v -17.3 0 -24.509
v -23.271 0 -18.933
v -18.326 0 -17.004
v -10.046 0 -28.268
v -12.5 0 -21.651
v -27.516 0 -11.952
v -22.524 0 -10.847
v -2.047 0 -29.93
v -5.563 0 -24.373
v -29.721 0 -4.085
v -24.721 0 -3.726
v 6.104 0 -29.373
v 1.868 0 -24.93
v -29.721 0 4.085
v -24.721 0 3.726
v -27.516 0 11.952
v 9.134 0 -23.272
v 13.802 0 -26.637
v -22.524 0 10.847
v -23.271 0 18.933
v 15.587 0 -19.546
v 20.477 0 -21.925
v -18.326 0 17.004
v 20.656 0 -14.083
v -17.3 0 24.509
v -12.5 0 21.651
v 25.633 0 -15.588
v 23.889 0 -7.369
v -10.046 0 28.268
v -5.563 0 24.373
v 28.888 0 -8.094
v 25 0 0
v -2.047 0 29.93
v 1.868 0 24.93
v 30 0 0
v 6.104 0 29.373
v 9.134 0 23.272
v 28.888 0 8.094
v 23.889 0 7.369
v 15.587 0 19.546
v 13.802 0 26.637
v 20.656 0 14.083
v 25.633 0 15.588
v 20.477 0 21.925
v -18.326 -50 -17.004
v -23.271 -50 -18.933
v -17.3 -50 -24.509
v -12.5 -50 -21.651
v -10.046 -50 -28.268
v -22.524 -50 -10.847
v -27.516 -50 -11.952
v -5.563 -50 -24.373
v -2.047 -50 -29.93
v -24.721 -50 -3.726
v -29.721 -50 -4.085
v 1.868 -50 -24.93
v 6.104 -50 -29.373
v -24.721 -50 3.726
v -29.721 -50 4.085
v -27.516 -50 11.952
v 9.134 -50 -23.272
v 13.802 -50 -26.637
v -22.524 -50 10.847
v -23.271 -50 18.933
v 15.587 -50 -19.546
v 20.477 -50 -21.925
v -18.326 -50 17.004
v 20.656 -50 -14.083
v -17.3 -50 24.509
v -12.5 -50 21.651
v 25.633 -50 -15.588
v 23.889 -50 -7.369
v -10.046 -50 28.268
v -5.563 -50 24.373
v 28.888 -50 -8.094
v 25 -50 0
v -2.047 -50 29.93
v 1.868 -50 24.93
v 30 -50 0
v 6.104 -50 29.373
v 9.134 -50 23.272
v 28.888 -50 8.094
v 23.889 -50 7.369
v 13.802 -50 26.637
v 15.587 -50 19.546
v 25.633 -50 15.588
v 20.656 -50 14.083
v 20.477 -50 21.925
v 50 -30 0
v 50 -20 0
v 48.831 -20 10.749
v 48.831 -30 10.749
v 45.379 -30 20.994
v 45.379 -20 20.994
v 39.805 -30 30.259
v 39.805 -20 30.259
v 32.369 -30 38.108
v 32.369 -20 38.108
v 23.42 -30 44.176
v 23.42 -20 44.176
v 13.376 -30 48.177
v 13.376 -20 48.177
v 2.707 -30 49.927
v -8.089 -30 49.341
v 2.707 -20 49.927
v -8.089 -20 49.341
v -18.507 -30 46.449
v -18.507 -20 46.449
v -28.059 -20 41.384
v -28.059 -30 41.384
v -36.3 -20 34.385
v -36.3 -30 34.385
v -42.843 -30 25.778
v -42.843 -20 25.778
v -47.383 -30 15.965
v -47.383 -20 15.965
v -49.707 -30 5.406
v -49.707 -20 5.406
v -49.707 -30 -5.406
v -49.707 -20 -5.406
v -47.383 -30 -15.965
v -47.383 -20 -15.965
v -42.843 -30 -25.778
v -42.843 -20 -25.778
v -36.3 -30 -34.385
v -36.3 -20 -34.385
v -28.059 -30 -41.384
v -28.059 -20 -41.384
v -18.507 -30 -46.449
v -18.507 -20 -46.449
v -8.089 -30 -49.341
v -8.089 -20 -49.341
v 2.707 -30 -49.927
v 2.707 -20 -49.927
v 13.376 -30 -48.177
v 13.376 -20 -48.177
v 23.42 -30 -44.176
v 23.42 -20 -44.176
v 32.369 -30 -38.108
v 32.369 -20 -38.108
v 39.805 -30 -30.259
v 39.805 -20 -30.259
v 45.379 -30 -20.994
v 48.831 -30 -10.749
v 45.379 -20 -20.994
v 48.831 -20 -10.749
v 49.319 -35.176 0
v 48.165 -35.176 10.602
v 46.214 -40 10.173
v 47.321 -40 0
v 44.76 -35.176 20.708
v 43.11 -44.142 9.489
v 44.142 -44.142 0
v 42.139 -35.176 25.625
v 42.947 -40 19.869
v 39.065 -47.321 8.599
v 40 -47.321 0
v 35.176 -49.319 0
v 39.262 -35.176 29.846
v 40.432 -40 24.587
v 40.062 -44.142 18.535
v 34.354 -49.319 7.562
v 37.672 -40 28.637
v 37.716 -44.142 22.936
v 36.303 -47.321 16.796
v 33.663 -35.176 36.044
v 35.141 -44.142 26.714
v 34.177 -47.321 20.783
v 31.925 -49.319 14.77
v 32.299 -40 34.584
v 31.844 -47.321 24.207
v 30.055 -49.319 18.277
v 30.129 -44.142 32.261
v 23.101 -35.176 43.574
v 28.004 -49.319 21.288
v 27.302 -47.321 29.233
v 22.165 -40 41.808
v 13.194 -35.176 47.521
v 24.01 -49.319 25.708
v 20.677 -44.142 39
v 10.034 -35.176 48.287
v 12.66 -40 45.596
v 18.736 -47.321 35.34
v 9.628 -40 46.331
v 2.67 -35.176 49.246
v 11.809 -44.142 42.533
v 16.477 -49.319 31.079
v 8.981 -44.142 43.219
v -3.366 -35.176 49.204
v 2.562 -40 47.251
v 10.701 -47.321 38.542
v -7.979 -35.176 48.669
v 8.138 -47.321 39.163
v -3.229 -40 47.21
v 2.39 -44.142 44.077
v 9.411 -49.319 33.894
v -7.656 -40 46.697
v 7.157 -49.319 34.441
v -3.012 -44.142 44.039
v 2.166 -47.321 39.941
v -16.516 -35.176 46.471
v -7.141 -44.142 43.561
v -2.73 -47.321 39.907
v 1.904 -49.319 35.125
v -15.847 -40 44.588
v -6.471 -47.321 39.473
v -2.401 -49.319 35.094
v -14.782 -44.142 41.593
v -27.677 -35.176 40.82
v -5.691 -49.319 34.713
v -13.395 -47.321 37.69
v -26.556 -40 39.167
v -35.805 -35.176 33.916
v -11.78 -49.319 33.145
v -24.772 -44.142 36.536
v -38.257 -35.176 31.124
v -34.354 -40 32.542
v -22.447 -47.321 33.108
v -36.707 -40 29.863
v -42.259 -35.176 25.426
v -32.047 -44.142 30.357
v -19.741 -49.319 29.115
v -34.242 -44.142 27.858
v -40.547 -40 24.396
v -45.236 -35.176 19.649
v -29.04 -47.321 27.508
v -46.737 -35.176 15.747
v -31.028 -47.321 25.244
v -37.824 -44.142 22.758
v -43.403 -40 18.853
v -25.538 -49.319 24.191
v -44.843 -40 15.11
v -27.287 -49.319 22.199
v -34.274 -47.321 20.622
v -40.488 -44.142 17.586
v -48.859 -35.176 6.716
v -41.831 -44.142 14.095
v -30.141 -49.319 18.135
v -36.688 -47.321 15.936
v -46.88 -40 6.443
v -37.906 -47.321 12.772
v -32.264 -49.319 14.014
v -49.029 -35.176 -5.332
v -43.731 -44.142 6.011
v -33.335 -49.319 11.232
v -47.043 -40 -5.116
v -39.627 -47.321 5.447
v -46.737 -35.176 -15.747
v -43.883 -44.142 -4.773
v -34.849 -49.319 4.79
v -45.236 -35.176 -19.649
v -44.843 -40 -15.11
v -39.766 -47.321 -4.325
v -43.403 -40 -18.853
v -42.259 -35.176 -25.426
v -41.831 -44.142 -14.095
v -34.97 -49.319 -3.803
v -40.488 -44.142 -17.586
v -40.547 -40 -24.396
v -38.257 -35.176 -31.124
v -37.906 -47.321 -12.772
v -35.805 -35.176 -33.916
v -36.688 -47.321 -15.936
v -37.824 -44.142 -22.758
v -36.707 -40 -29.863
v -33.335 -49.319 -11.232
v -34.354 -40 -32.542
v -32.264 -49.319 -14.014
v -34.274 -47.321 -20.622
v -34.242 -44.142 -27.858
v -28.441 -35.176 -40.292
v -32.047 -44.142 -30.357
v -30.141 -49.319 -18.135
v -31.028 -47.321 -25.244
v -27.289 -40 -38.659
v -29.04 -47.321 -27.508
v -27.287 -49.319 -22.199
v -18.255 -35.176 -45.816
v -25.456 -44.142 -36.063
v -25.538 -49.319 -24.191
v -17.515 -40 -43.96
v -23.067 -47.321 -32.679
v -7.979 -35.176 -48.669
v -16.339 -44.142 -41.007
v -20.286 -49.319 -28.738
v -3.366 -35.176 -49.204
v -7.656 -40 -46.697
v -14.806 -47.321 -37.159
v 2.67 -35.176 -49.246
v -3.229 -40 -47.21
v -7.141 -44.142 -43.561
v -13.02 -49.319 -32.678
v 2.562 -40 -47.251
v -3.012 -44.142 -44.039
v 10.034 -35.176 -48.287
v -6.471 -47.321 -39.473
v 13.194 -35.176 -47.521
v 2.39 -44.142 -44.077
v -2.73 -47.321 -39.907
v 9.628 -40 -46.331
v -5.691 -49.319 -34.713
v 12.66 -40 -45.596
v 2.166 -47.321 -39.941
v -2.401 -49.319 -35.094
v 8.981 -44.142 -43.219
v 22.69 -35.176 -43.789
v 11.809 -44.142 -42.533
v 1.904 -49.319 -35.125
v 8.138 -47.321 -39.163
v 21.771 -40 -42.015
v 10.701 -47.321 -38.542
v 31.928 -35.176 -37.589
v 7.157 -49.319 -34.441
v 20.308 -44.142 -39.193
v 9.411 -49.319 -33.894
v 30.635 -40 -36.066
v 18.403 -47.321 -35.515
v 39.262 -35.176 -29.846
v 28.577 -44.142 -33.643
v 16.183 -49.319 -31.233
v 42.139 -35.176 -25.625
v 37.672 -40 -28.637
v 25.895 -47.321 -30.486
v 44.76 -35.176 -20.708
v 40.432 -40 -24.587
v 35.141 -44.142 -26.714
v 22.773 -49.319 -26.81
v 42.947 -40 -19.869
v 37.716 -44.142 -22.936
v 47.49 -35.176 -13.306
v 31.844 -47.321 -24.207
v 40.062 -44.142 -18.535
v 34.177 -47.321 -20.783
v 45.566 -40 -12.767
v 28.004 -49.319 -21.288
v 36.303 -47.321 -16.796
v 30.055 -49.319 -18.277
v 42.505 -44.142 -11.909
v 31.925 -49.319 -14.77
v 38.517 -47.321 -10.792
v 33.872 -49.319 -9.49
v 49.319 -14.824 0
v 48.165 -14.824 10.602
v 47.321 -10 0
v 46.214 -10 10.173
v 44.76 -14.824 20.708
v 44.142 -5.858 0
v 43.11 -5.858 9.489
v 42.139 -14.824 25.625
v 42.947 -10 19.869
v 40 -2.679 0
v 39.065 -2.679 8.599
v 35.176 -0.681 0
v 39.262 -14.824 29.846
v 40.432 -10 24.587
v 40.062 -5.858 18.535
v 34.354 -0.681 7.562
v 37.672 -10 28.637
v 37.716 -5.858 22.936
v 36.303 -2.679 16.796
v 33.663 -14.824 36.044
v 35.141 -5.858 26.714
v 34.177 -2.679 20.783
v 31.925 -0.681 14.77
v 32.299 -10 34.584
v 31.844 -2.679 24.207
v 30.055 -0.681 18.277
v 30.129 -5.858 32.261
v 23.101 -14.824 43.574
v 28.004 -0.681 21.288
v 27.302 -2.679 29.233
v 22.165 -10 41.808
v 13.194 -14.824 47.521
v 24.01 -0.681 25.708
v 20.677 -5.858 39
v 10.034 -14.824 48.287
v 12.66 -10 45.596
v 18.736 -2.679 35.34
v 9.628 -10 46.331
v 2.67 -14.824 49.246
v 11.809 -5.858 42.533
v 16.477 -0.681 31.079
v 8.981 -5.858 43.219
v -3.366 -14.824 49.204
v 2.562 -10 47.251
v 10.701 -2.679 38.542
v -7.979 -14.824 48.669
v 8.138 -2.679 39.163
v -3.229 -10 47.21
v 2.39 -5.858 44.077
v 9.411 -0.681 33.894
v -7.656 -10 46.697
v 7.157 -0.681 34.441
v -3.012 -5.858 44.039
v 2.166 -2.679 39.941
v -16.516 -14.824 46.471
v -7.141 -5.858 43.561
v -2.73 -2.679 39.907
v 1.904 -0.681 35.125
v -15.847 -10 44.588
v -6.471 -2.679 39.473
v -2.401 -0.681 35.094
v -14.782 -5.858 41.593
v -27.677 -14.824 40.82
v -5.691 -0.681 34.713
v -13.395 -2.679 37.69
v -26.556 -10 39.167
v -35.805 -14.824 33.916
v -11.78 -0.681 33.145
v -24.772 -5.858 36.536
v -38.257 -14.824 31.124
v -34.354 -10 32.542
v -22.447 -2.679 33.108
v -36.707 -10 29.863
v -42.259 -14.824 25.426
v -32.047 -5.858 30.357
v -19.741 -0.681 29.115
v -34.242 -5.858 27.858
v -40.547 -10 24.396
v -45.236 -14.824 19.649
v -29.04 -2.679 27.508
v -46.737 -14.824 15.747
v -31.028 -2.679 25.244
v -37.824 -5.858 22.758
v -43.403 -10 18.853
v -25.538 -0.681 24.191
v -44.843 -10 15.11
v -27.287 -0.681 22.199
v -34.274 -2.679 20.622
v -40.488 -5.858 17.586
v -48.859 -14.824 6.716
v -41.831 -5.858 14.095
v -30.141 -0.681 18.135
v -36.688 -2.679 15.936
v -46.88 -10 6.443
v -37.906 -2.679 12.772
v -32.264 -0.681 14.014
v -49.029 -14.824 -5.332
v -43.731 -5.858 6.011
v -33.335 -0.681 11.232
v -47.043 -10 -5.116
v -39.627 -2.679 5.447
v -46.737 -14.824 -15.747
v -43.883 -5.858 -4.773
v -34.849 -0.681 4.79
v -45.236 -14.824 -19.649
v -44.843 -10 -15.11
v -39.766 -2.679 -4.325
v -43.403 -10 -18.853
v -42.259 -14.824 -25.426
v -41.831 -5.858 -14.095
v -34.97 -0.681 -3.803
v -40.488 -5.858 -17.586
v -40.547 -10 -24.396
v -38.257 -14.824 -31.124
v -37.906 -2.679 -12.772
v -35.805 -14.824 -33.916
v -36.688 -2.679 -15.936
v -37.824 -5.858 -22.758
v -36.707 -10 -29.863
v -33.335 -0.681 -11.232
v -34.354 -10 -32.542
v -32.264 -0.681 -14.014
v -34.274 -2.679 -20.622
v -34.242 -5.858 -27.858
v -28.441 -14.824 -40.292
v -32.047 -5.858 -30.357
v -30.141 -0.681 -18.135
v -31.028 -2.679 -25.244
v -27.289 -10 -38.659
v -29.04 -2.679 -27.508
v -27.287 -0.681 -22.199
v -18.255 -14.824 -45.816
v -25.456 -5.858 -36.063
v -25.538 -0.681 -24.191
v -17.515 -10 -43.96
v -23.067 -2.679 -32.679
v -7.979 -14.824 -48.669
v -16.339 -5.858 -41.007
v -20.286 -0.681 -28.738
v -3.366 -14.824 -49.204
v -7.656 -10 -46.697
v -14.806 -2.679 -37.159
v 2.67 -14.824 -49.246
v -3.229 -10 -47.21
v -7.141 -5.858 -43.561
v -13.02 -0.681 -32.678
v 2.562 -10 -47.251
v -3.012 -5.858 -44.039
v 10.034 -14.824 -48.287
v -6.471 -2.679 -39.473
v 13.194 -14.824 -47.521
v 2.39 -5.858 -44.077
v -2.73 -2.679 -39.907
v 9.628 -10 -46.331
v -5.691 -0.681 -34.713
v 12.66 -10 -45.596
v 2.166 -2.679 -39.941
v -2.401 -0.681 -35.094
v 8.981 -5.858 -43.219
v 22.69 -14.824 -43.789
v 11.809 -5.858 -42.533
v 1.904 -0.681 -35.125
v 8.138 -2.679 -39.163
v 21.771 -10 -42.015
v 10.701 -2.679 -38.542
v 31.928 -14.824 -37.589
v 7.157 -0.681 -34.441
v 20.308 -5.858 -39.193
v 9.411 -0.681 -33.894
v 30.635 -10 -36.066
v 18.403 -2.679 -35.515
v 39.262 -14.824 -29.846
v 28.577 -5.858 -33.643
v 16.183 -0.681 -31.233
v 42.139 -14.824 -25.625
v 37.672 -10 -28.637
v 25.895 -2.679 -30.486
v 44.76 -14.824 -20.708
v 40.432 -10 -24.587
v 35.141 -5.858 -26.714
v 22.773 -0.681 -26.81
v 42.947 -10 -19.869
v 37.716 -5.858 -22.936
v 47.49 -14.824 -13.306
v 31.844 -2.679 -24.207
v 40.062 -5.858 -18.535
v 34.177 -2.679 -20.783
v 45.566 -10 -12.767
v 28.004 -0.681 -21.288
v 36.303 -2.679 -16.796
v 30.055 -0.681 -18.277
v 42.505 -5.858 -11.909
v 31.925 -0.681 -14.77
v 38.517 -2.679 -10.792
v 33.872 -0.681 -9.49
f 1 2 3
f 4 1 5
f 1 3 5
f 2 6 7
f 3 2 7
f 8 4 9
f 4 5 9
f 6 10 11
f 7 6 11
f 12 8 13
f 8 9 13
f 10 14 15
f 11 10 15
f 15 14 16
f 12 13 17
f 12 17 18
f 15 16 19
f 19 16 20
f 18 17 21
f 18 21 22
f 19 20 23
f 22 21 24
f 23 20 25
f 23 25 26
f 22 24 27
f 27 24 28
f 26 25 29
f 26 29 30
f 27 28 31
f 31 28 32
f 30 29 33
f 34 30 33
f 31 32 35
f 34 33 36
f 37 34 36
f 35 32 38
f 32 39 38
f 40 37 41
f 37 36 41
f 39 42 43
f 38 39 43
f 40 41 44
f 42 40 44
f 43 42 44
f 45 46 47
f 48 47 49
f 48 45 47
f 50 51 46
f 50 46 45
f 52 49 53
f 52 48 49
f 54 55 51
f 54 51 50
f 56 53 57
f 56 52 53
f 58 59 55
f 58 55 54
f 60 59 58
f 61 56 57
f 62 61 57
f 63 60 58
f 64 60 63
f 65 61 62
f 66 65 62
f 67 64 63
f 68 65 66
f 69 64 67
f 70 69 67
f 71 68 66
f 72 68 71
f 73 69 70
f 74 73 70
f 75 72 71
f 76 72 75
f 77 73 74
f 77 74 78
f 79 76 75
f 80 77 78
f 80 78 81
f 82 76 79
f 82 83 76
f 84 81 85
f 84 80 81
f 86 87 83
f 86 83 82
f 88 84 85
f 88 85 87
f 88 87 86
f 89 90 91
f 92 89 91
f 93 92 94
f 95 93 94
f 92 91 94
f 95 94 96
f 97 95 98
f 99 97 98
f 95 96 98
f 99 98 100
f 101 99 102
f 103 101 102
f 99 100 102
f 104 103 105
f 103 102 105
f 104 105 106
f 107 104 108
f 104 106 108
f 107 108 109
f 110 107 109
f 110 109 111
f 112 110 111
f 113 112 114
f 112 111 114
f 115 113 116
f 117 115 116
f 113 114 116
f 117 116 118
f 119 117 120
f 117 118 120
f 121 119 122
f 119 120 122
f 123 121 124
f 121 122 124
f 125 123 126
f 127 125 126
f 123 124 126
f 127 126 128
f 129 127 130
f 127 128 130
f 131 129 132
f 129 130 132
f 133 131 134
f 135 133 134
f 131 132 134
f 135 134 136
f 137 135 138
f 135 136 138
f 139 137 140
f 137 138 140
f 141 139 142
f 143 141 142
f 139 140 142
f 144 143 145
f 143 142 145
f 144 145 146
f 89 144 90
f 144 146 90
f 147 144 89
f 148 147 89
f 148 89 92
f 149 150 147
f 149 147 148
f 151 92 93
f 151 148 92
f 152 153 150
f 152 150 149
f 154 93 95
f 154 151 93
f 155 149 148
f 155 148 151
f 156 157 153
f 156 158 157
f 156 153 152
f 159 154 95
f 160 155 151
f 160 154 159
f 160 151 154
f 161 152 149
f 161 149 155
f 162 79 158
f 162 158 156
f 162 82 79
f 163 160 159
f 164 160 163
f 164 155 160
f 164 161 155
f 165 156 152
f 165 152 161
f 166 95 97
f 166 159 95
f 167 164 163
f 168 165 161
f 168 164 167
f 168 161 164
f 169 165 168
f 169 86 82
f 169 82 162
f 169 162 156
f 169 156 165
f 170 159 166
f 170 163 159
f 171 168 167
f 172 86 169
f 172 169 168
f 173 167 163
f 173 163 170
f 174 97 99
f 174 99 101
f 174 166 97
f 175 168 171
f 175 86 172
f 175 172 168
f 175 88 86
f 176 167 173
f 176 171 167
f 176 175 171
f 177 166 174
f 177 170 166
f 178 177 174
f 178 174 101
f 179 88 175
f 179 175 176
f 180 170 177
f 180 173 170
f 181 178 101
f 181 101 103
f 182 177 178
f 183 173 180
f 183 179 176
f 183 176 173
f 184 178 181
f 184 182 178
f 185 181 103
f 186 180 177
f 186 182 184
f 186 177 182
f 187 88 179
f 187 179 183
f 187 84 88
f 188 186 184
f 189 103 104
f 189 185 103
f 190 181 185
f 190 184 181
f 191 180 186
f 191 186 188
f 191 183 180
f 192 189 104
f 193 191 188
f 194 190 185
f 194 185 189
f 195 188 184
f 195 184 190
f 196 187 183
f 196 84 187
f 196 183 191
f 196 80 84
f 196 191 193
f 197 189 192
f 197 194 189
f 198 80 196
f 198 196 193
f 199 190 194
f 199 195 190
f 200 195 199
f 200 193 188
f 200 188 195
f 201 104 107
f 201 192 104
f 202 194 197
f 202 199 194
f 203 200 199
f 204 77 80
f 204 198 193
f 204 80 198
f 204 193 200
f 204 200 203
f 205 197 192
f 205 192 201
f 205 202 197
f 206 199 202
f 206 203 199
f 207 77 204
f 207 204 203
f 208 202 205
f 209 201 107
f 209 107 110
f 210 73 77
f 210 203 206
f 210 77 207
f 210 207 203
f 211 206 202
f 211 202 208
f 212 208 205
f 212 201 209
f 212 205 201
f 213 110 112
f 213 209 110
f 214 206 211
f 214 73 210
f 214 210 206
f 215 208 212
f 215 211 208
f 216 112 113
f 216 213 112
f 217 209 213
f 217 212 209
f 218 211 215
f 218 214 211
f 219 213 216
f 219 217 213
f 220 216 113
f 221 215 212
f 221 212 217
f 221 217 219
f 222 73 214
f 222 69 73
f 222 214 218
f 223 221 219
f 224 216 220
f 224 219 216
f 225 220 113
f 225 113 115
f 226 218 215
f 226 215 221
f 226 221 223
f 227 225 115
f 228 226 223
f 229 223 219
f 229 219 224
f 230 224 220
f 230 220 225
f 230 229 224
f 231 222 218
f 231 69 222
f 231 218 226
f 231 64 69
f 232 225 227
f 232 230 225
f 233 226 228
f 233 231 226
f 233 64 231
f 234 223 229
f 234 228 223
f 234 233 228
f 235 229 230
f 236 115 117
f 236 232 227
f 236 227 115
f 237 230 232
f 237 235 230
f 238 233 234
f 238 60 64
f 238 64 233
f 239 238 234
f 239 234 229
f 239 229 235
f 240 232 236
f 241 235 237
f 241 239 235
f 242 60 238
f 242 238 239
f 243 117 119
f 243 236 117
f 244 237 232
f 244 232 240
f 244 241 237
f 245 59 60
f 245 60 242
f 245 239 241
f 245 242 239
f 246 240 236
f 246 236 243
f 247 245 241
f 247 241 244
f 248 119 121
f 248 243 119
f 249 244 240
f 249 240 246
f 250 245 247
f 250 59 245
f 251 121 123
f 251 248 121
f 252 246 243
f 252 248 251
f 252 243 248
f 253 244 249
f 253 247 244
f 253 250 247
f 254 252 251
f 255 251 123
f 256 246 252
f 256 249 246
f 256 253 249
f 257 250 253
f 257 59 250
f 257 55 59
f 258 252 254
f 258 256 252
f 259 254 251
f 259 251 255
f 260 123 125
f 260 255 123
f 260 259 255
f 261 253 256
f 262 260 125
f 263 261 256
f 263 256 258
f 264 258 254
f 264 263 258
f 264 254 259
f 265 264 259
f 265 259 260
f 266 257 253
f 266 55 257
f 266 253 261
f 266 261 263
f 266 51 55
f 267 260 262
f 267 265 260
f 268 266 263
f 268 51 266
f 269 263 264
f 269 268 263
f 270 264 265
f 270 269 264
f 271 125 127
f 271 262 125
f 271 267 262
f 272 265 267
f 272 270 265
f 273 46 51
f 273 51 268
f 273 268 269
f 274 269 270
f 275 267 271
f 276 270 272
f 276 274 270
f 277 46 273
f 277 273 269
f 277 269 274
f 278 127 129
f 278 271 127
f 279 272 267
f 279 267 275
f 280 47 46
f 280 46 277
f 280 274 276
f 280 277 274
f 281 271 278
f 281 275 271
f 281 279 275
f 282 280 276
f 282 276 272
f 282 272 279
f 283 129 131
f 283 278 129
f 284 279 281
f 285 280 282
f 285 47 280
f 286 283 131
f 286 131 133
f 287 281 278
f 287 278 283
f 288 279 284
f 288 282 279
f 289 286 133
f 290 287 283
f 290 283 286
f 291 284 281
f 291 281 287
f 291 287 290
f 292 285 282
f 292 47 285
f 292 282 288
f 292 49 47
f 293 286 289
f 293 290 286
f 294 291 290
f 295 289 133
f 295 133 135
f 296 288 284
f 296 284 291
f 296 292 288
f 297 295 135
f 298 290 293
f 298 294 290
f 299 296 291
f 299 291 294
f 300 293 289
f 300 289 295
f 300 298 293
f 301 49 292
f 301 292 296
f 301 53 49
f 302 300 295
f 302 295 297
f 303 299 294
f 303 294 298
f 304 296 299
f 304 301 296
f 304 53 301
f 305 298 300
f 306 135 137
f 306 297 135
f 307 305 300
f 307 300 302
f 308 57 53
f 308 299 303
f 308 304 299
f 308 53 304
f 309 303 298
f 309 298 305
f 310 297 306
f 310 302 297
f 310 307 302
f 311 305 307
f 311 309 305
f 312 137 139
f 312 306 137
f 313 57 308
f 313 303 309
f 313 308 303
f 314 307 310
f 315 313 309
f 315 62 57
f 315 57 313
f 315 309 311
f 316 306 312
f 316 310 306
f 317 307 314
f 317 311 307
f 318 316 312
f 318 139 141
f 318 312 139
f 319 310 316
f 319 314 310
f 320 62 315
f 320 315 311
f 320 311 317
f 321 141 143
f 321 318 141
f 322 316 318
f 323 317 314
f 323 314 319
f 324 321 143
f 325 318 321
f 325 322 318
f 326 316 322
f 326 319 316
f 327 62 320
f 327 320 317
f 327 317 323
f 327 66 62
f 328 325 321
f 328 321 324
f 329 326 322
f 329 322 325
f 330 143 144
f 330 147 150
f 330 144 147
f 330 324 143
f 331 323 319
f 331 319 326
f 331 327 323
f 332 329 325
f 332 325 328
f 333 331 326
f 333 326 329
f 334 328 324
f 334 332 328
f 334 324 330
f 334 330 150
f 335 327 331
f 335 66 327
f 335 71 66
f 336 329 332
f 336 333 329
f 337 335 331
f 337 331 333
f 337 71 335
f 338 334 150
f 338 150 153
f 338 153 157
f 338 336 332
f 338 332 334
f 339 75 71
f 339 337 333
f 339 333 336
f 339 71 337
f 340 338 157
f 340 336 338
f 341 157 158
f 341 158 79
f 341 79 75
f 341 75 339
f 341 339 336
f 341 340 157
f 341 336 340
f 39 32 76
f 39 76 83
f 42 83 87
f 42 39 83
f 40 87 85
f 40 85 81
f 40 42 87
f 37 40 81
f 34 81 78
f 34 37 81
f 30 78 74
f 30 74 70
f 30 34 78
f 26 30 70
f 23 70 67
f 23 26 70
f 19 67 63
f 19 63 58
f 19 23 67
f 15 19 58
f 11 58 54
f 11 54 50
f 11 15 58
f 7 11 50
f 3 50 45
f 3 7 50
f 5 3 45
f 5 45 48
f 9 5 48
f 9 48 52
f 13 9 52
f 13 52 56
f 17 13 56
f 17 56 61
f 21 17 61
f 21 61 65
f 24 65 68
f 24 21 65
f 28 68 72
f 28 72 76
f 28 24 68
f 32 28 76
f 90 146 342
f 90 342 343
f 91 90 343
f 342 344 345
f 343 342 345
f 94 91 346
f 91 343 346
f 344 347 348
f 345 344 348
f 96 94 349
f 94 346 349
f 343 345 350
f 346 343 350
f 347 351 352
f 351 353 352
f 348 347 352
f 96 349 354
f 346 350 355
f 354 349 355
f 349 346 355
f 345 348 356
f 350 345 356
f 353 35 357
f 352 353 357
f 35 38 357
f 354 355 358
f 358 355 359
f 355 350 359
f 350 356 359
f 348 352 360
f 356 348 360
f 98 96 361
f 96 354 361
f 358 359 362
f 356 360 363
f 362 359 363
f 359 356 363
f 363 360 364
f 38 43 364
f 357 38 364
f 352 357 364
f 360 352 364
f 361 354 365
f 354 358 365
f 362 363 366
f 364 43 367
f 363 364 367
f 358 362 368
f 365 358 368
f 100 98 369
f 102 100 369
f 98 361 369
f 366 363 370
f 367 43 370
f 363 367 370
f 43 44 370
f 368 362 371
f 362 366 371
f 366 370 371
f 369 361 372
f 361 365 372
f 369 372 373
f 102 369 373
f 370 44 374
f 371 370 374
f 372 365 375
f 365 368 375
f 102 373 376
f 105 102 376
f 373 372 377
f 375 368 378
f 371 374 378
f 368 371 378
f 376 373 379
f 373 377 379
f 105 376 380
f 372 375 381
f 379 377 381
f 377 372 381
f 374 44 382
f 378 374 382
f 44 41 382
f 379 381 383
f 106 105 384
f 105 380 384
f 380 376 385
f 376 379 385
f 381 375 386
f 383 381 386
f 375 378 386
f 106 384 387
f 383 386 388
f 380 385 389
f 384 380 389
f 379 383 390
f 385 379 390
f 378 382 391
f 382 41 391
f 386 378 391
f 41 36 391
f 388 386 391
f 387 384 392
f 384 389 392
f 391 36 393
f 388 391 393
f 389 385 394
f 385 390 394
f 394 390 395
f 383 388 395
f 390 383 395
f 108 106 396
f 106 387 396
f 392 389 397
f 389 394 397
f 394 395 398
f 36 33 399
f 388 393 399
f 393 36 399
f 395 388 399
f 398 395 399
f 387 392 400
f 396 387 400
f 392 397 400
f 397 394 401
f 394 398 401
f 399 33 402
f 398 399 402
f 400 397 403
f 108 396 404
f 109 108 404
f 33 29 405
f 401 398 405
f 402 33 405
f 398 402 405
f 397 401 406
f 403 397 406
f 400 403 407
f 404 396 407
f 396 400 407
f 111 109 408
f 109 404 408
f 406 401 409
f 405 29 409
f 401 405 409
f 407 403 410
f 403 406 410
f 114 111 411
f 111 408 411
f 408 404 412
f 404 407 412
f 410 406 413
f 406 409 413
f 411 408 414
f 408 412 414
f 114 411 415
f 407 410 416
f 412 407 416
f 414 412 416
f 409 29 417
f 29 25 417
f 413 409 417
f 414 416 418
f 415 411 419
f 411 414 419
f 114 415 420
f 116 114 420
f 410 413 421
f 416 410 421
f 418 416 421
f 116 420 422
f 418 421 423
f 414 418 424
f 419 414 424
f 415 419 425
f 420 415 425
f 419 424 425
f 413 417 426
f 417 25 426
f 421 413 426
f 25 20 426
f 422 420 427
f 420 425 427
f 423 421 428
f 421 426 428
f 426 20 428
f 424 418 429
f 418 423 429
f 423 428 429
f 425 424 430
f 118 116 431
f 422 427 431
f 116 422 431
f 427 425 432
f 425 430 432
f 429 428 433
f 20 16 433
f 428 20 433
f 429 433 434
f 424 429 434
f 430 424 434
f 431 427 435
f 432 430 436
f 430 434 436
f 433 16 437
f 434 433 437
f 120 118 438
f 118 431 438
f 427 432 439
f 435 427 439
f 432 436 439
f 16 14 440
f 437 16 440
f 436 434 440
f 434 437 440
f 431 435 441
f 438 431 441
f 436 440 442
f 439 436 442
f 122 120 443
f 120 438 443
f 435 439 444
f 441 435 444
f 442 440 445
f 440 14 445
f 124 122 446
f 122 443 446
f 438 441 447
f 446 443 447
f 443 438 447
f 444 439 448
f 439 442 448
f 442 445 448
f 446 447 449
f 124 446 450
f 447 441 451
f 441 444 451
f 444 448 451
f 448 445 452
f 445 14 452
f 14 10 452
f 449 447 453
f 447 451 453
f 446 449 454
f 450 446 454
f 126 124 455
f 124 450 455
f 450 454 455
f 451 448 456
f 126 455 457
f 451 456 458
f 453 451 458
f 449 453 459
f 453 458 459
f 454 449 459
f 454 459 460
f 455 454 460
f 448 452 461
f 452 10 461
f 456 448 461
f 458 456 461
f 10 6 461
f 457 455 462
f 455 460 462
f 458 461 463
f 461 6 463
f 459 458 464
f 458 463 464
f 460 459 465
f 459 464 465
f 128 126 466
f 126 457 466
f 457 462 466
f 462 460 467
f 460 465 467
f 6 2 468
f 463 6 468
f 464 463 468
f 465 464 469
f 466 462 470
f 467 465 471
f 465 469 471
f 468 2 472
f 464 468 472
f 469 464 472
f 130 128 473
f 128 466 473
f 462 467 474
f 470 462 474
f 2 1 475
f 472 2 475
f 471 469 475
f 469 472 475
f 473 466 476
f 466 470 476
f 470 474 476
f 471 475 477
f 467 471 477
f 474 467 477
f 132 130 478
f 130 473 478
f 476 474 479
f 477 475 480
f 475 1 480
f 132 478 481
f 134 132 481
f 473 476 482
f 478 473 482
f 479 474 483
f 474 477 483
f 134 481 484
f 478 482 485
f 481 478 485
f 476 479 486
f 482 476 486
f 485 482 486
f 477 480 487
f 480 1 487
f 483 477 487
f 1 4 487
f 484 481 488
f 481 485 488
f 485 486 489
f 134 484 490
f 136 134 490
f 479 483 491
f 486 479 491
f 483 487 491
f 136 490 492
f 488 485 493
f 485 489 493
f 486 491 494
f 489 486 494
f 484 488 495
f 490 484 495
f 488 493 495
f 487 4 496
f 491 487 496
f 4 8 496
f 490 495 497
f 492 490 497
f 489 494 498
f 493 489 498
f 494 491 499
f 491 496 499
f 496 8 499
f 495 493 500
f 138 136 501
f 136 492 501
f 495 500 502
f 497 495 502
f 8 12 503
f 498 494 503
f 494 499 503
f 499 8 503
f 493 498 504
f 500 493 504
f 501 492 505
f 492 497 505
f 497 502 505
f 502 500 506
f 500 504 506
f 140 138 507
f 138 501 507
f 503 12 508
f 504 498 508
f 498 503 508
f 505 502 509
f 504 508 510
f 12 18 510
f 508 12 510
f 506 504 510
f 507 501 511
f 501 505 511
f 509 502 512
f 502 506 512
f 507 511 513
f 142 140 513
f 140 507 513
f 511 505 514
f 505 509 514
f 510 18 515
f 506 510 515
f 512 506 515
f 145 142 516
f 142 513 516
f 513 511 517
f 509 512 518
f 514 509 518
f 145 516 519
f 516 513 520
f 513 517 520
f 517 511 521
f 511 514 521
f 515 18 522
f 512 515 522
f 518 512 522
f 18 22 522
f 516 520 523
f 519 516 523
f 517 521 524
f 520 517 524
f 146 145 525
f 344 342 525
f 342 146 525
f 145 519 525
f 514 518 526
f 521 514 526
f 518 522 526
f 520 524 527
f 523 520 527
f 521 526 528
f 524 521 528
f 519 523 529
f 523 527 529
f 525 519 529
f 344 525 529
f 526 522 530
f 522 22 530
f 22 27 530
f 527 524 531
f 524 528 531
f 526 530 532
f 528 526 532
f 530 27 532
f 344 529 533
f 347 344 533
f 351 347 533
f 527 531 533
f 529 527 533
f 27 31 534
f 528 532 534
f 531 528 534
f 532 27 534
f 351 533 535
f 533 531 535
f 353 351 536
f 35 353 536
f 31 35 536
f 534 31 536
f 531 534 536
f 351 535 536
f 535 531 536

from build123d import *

# Parameters (mm, degrees)
SKETCH_R    = 50
SKETCH_R_2  = 25
PAD_DEPTH   = 50
FILLET_R    = 20
FILLET001_R = 20


with BuildPart() as part:
    # Sketch → Pad (new body)
    with BuildSketch(Plane.XZ):
        Circle(SKETCH_R)
        Circle(SKETCH_R_2, mode=Mode.SUBTRACT)
    extrude(amount=PAD_DEPTH)

    # Fillet
    fillet_edges = [part.edges().sort_by_distance(p)[0] for p in [
        (-50, -50, 0),
    ]]
    fillet(fillet_edges, radius=FILLET_R)

    # Fillet001
    fillet001_edges = [part.edges().sort_by_distance(p)[0] for p in [
        (-50, 0, 0),
    ]]
    fillet(fillet001_edges, radius=FILLET001_R)


solid = part.part
